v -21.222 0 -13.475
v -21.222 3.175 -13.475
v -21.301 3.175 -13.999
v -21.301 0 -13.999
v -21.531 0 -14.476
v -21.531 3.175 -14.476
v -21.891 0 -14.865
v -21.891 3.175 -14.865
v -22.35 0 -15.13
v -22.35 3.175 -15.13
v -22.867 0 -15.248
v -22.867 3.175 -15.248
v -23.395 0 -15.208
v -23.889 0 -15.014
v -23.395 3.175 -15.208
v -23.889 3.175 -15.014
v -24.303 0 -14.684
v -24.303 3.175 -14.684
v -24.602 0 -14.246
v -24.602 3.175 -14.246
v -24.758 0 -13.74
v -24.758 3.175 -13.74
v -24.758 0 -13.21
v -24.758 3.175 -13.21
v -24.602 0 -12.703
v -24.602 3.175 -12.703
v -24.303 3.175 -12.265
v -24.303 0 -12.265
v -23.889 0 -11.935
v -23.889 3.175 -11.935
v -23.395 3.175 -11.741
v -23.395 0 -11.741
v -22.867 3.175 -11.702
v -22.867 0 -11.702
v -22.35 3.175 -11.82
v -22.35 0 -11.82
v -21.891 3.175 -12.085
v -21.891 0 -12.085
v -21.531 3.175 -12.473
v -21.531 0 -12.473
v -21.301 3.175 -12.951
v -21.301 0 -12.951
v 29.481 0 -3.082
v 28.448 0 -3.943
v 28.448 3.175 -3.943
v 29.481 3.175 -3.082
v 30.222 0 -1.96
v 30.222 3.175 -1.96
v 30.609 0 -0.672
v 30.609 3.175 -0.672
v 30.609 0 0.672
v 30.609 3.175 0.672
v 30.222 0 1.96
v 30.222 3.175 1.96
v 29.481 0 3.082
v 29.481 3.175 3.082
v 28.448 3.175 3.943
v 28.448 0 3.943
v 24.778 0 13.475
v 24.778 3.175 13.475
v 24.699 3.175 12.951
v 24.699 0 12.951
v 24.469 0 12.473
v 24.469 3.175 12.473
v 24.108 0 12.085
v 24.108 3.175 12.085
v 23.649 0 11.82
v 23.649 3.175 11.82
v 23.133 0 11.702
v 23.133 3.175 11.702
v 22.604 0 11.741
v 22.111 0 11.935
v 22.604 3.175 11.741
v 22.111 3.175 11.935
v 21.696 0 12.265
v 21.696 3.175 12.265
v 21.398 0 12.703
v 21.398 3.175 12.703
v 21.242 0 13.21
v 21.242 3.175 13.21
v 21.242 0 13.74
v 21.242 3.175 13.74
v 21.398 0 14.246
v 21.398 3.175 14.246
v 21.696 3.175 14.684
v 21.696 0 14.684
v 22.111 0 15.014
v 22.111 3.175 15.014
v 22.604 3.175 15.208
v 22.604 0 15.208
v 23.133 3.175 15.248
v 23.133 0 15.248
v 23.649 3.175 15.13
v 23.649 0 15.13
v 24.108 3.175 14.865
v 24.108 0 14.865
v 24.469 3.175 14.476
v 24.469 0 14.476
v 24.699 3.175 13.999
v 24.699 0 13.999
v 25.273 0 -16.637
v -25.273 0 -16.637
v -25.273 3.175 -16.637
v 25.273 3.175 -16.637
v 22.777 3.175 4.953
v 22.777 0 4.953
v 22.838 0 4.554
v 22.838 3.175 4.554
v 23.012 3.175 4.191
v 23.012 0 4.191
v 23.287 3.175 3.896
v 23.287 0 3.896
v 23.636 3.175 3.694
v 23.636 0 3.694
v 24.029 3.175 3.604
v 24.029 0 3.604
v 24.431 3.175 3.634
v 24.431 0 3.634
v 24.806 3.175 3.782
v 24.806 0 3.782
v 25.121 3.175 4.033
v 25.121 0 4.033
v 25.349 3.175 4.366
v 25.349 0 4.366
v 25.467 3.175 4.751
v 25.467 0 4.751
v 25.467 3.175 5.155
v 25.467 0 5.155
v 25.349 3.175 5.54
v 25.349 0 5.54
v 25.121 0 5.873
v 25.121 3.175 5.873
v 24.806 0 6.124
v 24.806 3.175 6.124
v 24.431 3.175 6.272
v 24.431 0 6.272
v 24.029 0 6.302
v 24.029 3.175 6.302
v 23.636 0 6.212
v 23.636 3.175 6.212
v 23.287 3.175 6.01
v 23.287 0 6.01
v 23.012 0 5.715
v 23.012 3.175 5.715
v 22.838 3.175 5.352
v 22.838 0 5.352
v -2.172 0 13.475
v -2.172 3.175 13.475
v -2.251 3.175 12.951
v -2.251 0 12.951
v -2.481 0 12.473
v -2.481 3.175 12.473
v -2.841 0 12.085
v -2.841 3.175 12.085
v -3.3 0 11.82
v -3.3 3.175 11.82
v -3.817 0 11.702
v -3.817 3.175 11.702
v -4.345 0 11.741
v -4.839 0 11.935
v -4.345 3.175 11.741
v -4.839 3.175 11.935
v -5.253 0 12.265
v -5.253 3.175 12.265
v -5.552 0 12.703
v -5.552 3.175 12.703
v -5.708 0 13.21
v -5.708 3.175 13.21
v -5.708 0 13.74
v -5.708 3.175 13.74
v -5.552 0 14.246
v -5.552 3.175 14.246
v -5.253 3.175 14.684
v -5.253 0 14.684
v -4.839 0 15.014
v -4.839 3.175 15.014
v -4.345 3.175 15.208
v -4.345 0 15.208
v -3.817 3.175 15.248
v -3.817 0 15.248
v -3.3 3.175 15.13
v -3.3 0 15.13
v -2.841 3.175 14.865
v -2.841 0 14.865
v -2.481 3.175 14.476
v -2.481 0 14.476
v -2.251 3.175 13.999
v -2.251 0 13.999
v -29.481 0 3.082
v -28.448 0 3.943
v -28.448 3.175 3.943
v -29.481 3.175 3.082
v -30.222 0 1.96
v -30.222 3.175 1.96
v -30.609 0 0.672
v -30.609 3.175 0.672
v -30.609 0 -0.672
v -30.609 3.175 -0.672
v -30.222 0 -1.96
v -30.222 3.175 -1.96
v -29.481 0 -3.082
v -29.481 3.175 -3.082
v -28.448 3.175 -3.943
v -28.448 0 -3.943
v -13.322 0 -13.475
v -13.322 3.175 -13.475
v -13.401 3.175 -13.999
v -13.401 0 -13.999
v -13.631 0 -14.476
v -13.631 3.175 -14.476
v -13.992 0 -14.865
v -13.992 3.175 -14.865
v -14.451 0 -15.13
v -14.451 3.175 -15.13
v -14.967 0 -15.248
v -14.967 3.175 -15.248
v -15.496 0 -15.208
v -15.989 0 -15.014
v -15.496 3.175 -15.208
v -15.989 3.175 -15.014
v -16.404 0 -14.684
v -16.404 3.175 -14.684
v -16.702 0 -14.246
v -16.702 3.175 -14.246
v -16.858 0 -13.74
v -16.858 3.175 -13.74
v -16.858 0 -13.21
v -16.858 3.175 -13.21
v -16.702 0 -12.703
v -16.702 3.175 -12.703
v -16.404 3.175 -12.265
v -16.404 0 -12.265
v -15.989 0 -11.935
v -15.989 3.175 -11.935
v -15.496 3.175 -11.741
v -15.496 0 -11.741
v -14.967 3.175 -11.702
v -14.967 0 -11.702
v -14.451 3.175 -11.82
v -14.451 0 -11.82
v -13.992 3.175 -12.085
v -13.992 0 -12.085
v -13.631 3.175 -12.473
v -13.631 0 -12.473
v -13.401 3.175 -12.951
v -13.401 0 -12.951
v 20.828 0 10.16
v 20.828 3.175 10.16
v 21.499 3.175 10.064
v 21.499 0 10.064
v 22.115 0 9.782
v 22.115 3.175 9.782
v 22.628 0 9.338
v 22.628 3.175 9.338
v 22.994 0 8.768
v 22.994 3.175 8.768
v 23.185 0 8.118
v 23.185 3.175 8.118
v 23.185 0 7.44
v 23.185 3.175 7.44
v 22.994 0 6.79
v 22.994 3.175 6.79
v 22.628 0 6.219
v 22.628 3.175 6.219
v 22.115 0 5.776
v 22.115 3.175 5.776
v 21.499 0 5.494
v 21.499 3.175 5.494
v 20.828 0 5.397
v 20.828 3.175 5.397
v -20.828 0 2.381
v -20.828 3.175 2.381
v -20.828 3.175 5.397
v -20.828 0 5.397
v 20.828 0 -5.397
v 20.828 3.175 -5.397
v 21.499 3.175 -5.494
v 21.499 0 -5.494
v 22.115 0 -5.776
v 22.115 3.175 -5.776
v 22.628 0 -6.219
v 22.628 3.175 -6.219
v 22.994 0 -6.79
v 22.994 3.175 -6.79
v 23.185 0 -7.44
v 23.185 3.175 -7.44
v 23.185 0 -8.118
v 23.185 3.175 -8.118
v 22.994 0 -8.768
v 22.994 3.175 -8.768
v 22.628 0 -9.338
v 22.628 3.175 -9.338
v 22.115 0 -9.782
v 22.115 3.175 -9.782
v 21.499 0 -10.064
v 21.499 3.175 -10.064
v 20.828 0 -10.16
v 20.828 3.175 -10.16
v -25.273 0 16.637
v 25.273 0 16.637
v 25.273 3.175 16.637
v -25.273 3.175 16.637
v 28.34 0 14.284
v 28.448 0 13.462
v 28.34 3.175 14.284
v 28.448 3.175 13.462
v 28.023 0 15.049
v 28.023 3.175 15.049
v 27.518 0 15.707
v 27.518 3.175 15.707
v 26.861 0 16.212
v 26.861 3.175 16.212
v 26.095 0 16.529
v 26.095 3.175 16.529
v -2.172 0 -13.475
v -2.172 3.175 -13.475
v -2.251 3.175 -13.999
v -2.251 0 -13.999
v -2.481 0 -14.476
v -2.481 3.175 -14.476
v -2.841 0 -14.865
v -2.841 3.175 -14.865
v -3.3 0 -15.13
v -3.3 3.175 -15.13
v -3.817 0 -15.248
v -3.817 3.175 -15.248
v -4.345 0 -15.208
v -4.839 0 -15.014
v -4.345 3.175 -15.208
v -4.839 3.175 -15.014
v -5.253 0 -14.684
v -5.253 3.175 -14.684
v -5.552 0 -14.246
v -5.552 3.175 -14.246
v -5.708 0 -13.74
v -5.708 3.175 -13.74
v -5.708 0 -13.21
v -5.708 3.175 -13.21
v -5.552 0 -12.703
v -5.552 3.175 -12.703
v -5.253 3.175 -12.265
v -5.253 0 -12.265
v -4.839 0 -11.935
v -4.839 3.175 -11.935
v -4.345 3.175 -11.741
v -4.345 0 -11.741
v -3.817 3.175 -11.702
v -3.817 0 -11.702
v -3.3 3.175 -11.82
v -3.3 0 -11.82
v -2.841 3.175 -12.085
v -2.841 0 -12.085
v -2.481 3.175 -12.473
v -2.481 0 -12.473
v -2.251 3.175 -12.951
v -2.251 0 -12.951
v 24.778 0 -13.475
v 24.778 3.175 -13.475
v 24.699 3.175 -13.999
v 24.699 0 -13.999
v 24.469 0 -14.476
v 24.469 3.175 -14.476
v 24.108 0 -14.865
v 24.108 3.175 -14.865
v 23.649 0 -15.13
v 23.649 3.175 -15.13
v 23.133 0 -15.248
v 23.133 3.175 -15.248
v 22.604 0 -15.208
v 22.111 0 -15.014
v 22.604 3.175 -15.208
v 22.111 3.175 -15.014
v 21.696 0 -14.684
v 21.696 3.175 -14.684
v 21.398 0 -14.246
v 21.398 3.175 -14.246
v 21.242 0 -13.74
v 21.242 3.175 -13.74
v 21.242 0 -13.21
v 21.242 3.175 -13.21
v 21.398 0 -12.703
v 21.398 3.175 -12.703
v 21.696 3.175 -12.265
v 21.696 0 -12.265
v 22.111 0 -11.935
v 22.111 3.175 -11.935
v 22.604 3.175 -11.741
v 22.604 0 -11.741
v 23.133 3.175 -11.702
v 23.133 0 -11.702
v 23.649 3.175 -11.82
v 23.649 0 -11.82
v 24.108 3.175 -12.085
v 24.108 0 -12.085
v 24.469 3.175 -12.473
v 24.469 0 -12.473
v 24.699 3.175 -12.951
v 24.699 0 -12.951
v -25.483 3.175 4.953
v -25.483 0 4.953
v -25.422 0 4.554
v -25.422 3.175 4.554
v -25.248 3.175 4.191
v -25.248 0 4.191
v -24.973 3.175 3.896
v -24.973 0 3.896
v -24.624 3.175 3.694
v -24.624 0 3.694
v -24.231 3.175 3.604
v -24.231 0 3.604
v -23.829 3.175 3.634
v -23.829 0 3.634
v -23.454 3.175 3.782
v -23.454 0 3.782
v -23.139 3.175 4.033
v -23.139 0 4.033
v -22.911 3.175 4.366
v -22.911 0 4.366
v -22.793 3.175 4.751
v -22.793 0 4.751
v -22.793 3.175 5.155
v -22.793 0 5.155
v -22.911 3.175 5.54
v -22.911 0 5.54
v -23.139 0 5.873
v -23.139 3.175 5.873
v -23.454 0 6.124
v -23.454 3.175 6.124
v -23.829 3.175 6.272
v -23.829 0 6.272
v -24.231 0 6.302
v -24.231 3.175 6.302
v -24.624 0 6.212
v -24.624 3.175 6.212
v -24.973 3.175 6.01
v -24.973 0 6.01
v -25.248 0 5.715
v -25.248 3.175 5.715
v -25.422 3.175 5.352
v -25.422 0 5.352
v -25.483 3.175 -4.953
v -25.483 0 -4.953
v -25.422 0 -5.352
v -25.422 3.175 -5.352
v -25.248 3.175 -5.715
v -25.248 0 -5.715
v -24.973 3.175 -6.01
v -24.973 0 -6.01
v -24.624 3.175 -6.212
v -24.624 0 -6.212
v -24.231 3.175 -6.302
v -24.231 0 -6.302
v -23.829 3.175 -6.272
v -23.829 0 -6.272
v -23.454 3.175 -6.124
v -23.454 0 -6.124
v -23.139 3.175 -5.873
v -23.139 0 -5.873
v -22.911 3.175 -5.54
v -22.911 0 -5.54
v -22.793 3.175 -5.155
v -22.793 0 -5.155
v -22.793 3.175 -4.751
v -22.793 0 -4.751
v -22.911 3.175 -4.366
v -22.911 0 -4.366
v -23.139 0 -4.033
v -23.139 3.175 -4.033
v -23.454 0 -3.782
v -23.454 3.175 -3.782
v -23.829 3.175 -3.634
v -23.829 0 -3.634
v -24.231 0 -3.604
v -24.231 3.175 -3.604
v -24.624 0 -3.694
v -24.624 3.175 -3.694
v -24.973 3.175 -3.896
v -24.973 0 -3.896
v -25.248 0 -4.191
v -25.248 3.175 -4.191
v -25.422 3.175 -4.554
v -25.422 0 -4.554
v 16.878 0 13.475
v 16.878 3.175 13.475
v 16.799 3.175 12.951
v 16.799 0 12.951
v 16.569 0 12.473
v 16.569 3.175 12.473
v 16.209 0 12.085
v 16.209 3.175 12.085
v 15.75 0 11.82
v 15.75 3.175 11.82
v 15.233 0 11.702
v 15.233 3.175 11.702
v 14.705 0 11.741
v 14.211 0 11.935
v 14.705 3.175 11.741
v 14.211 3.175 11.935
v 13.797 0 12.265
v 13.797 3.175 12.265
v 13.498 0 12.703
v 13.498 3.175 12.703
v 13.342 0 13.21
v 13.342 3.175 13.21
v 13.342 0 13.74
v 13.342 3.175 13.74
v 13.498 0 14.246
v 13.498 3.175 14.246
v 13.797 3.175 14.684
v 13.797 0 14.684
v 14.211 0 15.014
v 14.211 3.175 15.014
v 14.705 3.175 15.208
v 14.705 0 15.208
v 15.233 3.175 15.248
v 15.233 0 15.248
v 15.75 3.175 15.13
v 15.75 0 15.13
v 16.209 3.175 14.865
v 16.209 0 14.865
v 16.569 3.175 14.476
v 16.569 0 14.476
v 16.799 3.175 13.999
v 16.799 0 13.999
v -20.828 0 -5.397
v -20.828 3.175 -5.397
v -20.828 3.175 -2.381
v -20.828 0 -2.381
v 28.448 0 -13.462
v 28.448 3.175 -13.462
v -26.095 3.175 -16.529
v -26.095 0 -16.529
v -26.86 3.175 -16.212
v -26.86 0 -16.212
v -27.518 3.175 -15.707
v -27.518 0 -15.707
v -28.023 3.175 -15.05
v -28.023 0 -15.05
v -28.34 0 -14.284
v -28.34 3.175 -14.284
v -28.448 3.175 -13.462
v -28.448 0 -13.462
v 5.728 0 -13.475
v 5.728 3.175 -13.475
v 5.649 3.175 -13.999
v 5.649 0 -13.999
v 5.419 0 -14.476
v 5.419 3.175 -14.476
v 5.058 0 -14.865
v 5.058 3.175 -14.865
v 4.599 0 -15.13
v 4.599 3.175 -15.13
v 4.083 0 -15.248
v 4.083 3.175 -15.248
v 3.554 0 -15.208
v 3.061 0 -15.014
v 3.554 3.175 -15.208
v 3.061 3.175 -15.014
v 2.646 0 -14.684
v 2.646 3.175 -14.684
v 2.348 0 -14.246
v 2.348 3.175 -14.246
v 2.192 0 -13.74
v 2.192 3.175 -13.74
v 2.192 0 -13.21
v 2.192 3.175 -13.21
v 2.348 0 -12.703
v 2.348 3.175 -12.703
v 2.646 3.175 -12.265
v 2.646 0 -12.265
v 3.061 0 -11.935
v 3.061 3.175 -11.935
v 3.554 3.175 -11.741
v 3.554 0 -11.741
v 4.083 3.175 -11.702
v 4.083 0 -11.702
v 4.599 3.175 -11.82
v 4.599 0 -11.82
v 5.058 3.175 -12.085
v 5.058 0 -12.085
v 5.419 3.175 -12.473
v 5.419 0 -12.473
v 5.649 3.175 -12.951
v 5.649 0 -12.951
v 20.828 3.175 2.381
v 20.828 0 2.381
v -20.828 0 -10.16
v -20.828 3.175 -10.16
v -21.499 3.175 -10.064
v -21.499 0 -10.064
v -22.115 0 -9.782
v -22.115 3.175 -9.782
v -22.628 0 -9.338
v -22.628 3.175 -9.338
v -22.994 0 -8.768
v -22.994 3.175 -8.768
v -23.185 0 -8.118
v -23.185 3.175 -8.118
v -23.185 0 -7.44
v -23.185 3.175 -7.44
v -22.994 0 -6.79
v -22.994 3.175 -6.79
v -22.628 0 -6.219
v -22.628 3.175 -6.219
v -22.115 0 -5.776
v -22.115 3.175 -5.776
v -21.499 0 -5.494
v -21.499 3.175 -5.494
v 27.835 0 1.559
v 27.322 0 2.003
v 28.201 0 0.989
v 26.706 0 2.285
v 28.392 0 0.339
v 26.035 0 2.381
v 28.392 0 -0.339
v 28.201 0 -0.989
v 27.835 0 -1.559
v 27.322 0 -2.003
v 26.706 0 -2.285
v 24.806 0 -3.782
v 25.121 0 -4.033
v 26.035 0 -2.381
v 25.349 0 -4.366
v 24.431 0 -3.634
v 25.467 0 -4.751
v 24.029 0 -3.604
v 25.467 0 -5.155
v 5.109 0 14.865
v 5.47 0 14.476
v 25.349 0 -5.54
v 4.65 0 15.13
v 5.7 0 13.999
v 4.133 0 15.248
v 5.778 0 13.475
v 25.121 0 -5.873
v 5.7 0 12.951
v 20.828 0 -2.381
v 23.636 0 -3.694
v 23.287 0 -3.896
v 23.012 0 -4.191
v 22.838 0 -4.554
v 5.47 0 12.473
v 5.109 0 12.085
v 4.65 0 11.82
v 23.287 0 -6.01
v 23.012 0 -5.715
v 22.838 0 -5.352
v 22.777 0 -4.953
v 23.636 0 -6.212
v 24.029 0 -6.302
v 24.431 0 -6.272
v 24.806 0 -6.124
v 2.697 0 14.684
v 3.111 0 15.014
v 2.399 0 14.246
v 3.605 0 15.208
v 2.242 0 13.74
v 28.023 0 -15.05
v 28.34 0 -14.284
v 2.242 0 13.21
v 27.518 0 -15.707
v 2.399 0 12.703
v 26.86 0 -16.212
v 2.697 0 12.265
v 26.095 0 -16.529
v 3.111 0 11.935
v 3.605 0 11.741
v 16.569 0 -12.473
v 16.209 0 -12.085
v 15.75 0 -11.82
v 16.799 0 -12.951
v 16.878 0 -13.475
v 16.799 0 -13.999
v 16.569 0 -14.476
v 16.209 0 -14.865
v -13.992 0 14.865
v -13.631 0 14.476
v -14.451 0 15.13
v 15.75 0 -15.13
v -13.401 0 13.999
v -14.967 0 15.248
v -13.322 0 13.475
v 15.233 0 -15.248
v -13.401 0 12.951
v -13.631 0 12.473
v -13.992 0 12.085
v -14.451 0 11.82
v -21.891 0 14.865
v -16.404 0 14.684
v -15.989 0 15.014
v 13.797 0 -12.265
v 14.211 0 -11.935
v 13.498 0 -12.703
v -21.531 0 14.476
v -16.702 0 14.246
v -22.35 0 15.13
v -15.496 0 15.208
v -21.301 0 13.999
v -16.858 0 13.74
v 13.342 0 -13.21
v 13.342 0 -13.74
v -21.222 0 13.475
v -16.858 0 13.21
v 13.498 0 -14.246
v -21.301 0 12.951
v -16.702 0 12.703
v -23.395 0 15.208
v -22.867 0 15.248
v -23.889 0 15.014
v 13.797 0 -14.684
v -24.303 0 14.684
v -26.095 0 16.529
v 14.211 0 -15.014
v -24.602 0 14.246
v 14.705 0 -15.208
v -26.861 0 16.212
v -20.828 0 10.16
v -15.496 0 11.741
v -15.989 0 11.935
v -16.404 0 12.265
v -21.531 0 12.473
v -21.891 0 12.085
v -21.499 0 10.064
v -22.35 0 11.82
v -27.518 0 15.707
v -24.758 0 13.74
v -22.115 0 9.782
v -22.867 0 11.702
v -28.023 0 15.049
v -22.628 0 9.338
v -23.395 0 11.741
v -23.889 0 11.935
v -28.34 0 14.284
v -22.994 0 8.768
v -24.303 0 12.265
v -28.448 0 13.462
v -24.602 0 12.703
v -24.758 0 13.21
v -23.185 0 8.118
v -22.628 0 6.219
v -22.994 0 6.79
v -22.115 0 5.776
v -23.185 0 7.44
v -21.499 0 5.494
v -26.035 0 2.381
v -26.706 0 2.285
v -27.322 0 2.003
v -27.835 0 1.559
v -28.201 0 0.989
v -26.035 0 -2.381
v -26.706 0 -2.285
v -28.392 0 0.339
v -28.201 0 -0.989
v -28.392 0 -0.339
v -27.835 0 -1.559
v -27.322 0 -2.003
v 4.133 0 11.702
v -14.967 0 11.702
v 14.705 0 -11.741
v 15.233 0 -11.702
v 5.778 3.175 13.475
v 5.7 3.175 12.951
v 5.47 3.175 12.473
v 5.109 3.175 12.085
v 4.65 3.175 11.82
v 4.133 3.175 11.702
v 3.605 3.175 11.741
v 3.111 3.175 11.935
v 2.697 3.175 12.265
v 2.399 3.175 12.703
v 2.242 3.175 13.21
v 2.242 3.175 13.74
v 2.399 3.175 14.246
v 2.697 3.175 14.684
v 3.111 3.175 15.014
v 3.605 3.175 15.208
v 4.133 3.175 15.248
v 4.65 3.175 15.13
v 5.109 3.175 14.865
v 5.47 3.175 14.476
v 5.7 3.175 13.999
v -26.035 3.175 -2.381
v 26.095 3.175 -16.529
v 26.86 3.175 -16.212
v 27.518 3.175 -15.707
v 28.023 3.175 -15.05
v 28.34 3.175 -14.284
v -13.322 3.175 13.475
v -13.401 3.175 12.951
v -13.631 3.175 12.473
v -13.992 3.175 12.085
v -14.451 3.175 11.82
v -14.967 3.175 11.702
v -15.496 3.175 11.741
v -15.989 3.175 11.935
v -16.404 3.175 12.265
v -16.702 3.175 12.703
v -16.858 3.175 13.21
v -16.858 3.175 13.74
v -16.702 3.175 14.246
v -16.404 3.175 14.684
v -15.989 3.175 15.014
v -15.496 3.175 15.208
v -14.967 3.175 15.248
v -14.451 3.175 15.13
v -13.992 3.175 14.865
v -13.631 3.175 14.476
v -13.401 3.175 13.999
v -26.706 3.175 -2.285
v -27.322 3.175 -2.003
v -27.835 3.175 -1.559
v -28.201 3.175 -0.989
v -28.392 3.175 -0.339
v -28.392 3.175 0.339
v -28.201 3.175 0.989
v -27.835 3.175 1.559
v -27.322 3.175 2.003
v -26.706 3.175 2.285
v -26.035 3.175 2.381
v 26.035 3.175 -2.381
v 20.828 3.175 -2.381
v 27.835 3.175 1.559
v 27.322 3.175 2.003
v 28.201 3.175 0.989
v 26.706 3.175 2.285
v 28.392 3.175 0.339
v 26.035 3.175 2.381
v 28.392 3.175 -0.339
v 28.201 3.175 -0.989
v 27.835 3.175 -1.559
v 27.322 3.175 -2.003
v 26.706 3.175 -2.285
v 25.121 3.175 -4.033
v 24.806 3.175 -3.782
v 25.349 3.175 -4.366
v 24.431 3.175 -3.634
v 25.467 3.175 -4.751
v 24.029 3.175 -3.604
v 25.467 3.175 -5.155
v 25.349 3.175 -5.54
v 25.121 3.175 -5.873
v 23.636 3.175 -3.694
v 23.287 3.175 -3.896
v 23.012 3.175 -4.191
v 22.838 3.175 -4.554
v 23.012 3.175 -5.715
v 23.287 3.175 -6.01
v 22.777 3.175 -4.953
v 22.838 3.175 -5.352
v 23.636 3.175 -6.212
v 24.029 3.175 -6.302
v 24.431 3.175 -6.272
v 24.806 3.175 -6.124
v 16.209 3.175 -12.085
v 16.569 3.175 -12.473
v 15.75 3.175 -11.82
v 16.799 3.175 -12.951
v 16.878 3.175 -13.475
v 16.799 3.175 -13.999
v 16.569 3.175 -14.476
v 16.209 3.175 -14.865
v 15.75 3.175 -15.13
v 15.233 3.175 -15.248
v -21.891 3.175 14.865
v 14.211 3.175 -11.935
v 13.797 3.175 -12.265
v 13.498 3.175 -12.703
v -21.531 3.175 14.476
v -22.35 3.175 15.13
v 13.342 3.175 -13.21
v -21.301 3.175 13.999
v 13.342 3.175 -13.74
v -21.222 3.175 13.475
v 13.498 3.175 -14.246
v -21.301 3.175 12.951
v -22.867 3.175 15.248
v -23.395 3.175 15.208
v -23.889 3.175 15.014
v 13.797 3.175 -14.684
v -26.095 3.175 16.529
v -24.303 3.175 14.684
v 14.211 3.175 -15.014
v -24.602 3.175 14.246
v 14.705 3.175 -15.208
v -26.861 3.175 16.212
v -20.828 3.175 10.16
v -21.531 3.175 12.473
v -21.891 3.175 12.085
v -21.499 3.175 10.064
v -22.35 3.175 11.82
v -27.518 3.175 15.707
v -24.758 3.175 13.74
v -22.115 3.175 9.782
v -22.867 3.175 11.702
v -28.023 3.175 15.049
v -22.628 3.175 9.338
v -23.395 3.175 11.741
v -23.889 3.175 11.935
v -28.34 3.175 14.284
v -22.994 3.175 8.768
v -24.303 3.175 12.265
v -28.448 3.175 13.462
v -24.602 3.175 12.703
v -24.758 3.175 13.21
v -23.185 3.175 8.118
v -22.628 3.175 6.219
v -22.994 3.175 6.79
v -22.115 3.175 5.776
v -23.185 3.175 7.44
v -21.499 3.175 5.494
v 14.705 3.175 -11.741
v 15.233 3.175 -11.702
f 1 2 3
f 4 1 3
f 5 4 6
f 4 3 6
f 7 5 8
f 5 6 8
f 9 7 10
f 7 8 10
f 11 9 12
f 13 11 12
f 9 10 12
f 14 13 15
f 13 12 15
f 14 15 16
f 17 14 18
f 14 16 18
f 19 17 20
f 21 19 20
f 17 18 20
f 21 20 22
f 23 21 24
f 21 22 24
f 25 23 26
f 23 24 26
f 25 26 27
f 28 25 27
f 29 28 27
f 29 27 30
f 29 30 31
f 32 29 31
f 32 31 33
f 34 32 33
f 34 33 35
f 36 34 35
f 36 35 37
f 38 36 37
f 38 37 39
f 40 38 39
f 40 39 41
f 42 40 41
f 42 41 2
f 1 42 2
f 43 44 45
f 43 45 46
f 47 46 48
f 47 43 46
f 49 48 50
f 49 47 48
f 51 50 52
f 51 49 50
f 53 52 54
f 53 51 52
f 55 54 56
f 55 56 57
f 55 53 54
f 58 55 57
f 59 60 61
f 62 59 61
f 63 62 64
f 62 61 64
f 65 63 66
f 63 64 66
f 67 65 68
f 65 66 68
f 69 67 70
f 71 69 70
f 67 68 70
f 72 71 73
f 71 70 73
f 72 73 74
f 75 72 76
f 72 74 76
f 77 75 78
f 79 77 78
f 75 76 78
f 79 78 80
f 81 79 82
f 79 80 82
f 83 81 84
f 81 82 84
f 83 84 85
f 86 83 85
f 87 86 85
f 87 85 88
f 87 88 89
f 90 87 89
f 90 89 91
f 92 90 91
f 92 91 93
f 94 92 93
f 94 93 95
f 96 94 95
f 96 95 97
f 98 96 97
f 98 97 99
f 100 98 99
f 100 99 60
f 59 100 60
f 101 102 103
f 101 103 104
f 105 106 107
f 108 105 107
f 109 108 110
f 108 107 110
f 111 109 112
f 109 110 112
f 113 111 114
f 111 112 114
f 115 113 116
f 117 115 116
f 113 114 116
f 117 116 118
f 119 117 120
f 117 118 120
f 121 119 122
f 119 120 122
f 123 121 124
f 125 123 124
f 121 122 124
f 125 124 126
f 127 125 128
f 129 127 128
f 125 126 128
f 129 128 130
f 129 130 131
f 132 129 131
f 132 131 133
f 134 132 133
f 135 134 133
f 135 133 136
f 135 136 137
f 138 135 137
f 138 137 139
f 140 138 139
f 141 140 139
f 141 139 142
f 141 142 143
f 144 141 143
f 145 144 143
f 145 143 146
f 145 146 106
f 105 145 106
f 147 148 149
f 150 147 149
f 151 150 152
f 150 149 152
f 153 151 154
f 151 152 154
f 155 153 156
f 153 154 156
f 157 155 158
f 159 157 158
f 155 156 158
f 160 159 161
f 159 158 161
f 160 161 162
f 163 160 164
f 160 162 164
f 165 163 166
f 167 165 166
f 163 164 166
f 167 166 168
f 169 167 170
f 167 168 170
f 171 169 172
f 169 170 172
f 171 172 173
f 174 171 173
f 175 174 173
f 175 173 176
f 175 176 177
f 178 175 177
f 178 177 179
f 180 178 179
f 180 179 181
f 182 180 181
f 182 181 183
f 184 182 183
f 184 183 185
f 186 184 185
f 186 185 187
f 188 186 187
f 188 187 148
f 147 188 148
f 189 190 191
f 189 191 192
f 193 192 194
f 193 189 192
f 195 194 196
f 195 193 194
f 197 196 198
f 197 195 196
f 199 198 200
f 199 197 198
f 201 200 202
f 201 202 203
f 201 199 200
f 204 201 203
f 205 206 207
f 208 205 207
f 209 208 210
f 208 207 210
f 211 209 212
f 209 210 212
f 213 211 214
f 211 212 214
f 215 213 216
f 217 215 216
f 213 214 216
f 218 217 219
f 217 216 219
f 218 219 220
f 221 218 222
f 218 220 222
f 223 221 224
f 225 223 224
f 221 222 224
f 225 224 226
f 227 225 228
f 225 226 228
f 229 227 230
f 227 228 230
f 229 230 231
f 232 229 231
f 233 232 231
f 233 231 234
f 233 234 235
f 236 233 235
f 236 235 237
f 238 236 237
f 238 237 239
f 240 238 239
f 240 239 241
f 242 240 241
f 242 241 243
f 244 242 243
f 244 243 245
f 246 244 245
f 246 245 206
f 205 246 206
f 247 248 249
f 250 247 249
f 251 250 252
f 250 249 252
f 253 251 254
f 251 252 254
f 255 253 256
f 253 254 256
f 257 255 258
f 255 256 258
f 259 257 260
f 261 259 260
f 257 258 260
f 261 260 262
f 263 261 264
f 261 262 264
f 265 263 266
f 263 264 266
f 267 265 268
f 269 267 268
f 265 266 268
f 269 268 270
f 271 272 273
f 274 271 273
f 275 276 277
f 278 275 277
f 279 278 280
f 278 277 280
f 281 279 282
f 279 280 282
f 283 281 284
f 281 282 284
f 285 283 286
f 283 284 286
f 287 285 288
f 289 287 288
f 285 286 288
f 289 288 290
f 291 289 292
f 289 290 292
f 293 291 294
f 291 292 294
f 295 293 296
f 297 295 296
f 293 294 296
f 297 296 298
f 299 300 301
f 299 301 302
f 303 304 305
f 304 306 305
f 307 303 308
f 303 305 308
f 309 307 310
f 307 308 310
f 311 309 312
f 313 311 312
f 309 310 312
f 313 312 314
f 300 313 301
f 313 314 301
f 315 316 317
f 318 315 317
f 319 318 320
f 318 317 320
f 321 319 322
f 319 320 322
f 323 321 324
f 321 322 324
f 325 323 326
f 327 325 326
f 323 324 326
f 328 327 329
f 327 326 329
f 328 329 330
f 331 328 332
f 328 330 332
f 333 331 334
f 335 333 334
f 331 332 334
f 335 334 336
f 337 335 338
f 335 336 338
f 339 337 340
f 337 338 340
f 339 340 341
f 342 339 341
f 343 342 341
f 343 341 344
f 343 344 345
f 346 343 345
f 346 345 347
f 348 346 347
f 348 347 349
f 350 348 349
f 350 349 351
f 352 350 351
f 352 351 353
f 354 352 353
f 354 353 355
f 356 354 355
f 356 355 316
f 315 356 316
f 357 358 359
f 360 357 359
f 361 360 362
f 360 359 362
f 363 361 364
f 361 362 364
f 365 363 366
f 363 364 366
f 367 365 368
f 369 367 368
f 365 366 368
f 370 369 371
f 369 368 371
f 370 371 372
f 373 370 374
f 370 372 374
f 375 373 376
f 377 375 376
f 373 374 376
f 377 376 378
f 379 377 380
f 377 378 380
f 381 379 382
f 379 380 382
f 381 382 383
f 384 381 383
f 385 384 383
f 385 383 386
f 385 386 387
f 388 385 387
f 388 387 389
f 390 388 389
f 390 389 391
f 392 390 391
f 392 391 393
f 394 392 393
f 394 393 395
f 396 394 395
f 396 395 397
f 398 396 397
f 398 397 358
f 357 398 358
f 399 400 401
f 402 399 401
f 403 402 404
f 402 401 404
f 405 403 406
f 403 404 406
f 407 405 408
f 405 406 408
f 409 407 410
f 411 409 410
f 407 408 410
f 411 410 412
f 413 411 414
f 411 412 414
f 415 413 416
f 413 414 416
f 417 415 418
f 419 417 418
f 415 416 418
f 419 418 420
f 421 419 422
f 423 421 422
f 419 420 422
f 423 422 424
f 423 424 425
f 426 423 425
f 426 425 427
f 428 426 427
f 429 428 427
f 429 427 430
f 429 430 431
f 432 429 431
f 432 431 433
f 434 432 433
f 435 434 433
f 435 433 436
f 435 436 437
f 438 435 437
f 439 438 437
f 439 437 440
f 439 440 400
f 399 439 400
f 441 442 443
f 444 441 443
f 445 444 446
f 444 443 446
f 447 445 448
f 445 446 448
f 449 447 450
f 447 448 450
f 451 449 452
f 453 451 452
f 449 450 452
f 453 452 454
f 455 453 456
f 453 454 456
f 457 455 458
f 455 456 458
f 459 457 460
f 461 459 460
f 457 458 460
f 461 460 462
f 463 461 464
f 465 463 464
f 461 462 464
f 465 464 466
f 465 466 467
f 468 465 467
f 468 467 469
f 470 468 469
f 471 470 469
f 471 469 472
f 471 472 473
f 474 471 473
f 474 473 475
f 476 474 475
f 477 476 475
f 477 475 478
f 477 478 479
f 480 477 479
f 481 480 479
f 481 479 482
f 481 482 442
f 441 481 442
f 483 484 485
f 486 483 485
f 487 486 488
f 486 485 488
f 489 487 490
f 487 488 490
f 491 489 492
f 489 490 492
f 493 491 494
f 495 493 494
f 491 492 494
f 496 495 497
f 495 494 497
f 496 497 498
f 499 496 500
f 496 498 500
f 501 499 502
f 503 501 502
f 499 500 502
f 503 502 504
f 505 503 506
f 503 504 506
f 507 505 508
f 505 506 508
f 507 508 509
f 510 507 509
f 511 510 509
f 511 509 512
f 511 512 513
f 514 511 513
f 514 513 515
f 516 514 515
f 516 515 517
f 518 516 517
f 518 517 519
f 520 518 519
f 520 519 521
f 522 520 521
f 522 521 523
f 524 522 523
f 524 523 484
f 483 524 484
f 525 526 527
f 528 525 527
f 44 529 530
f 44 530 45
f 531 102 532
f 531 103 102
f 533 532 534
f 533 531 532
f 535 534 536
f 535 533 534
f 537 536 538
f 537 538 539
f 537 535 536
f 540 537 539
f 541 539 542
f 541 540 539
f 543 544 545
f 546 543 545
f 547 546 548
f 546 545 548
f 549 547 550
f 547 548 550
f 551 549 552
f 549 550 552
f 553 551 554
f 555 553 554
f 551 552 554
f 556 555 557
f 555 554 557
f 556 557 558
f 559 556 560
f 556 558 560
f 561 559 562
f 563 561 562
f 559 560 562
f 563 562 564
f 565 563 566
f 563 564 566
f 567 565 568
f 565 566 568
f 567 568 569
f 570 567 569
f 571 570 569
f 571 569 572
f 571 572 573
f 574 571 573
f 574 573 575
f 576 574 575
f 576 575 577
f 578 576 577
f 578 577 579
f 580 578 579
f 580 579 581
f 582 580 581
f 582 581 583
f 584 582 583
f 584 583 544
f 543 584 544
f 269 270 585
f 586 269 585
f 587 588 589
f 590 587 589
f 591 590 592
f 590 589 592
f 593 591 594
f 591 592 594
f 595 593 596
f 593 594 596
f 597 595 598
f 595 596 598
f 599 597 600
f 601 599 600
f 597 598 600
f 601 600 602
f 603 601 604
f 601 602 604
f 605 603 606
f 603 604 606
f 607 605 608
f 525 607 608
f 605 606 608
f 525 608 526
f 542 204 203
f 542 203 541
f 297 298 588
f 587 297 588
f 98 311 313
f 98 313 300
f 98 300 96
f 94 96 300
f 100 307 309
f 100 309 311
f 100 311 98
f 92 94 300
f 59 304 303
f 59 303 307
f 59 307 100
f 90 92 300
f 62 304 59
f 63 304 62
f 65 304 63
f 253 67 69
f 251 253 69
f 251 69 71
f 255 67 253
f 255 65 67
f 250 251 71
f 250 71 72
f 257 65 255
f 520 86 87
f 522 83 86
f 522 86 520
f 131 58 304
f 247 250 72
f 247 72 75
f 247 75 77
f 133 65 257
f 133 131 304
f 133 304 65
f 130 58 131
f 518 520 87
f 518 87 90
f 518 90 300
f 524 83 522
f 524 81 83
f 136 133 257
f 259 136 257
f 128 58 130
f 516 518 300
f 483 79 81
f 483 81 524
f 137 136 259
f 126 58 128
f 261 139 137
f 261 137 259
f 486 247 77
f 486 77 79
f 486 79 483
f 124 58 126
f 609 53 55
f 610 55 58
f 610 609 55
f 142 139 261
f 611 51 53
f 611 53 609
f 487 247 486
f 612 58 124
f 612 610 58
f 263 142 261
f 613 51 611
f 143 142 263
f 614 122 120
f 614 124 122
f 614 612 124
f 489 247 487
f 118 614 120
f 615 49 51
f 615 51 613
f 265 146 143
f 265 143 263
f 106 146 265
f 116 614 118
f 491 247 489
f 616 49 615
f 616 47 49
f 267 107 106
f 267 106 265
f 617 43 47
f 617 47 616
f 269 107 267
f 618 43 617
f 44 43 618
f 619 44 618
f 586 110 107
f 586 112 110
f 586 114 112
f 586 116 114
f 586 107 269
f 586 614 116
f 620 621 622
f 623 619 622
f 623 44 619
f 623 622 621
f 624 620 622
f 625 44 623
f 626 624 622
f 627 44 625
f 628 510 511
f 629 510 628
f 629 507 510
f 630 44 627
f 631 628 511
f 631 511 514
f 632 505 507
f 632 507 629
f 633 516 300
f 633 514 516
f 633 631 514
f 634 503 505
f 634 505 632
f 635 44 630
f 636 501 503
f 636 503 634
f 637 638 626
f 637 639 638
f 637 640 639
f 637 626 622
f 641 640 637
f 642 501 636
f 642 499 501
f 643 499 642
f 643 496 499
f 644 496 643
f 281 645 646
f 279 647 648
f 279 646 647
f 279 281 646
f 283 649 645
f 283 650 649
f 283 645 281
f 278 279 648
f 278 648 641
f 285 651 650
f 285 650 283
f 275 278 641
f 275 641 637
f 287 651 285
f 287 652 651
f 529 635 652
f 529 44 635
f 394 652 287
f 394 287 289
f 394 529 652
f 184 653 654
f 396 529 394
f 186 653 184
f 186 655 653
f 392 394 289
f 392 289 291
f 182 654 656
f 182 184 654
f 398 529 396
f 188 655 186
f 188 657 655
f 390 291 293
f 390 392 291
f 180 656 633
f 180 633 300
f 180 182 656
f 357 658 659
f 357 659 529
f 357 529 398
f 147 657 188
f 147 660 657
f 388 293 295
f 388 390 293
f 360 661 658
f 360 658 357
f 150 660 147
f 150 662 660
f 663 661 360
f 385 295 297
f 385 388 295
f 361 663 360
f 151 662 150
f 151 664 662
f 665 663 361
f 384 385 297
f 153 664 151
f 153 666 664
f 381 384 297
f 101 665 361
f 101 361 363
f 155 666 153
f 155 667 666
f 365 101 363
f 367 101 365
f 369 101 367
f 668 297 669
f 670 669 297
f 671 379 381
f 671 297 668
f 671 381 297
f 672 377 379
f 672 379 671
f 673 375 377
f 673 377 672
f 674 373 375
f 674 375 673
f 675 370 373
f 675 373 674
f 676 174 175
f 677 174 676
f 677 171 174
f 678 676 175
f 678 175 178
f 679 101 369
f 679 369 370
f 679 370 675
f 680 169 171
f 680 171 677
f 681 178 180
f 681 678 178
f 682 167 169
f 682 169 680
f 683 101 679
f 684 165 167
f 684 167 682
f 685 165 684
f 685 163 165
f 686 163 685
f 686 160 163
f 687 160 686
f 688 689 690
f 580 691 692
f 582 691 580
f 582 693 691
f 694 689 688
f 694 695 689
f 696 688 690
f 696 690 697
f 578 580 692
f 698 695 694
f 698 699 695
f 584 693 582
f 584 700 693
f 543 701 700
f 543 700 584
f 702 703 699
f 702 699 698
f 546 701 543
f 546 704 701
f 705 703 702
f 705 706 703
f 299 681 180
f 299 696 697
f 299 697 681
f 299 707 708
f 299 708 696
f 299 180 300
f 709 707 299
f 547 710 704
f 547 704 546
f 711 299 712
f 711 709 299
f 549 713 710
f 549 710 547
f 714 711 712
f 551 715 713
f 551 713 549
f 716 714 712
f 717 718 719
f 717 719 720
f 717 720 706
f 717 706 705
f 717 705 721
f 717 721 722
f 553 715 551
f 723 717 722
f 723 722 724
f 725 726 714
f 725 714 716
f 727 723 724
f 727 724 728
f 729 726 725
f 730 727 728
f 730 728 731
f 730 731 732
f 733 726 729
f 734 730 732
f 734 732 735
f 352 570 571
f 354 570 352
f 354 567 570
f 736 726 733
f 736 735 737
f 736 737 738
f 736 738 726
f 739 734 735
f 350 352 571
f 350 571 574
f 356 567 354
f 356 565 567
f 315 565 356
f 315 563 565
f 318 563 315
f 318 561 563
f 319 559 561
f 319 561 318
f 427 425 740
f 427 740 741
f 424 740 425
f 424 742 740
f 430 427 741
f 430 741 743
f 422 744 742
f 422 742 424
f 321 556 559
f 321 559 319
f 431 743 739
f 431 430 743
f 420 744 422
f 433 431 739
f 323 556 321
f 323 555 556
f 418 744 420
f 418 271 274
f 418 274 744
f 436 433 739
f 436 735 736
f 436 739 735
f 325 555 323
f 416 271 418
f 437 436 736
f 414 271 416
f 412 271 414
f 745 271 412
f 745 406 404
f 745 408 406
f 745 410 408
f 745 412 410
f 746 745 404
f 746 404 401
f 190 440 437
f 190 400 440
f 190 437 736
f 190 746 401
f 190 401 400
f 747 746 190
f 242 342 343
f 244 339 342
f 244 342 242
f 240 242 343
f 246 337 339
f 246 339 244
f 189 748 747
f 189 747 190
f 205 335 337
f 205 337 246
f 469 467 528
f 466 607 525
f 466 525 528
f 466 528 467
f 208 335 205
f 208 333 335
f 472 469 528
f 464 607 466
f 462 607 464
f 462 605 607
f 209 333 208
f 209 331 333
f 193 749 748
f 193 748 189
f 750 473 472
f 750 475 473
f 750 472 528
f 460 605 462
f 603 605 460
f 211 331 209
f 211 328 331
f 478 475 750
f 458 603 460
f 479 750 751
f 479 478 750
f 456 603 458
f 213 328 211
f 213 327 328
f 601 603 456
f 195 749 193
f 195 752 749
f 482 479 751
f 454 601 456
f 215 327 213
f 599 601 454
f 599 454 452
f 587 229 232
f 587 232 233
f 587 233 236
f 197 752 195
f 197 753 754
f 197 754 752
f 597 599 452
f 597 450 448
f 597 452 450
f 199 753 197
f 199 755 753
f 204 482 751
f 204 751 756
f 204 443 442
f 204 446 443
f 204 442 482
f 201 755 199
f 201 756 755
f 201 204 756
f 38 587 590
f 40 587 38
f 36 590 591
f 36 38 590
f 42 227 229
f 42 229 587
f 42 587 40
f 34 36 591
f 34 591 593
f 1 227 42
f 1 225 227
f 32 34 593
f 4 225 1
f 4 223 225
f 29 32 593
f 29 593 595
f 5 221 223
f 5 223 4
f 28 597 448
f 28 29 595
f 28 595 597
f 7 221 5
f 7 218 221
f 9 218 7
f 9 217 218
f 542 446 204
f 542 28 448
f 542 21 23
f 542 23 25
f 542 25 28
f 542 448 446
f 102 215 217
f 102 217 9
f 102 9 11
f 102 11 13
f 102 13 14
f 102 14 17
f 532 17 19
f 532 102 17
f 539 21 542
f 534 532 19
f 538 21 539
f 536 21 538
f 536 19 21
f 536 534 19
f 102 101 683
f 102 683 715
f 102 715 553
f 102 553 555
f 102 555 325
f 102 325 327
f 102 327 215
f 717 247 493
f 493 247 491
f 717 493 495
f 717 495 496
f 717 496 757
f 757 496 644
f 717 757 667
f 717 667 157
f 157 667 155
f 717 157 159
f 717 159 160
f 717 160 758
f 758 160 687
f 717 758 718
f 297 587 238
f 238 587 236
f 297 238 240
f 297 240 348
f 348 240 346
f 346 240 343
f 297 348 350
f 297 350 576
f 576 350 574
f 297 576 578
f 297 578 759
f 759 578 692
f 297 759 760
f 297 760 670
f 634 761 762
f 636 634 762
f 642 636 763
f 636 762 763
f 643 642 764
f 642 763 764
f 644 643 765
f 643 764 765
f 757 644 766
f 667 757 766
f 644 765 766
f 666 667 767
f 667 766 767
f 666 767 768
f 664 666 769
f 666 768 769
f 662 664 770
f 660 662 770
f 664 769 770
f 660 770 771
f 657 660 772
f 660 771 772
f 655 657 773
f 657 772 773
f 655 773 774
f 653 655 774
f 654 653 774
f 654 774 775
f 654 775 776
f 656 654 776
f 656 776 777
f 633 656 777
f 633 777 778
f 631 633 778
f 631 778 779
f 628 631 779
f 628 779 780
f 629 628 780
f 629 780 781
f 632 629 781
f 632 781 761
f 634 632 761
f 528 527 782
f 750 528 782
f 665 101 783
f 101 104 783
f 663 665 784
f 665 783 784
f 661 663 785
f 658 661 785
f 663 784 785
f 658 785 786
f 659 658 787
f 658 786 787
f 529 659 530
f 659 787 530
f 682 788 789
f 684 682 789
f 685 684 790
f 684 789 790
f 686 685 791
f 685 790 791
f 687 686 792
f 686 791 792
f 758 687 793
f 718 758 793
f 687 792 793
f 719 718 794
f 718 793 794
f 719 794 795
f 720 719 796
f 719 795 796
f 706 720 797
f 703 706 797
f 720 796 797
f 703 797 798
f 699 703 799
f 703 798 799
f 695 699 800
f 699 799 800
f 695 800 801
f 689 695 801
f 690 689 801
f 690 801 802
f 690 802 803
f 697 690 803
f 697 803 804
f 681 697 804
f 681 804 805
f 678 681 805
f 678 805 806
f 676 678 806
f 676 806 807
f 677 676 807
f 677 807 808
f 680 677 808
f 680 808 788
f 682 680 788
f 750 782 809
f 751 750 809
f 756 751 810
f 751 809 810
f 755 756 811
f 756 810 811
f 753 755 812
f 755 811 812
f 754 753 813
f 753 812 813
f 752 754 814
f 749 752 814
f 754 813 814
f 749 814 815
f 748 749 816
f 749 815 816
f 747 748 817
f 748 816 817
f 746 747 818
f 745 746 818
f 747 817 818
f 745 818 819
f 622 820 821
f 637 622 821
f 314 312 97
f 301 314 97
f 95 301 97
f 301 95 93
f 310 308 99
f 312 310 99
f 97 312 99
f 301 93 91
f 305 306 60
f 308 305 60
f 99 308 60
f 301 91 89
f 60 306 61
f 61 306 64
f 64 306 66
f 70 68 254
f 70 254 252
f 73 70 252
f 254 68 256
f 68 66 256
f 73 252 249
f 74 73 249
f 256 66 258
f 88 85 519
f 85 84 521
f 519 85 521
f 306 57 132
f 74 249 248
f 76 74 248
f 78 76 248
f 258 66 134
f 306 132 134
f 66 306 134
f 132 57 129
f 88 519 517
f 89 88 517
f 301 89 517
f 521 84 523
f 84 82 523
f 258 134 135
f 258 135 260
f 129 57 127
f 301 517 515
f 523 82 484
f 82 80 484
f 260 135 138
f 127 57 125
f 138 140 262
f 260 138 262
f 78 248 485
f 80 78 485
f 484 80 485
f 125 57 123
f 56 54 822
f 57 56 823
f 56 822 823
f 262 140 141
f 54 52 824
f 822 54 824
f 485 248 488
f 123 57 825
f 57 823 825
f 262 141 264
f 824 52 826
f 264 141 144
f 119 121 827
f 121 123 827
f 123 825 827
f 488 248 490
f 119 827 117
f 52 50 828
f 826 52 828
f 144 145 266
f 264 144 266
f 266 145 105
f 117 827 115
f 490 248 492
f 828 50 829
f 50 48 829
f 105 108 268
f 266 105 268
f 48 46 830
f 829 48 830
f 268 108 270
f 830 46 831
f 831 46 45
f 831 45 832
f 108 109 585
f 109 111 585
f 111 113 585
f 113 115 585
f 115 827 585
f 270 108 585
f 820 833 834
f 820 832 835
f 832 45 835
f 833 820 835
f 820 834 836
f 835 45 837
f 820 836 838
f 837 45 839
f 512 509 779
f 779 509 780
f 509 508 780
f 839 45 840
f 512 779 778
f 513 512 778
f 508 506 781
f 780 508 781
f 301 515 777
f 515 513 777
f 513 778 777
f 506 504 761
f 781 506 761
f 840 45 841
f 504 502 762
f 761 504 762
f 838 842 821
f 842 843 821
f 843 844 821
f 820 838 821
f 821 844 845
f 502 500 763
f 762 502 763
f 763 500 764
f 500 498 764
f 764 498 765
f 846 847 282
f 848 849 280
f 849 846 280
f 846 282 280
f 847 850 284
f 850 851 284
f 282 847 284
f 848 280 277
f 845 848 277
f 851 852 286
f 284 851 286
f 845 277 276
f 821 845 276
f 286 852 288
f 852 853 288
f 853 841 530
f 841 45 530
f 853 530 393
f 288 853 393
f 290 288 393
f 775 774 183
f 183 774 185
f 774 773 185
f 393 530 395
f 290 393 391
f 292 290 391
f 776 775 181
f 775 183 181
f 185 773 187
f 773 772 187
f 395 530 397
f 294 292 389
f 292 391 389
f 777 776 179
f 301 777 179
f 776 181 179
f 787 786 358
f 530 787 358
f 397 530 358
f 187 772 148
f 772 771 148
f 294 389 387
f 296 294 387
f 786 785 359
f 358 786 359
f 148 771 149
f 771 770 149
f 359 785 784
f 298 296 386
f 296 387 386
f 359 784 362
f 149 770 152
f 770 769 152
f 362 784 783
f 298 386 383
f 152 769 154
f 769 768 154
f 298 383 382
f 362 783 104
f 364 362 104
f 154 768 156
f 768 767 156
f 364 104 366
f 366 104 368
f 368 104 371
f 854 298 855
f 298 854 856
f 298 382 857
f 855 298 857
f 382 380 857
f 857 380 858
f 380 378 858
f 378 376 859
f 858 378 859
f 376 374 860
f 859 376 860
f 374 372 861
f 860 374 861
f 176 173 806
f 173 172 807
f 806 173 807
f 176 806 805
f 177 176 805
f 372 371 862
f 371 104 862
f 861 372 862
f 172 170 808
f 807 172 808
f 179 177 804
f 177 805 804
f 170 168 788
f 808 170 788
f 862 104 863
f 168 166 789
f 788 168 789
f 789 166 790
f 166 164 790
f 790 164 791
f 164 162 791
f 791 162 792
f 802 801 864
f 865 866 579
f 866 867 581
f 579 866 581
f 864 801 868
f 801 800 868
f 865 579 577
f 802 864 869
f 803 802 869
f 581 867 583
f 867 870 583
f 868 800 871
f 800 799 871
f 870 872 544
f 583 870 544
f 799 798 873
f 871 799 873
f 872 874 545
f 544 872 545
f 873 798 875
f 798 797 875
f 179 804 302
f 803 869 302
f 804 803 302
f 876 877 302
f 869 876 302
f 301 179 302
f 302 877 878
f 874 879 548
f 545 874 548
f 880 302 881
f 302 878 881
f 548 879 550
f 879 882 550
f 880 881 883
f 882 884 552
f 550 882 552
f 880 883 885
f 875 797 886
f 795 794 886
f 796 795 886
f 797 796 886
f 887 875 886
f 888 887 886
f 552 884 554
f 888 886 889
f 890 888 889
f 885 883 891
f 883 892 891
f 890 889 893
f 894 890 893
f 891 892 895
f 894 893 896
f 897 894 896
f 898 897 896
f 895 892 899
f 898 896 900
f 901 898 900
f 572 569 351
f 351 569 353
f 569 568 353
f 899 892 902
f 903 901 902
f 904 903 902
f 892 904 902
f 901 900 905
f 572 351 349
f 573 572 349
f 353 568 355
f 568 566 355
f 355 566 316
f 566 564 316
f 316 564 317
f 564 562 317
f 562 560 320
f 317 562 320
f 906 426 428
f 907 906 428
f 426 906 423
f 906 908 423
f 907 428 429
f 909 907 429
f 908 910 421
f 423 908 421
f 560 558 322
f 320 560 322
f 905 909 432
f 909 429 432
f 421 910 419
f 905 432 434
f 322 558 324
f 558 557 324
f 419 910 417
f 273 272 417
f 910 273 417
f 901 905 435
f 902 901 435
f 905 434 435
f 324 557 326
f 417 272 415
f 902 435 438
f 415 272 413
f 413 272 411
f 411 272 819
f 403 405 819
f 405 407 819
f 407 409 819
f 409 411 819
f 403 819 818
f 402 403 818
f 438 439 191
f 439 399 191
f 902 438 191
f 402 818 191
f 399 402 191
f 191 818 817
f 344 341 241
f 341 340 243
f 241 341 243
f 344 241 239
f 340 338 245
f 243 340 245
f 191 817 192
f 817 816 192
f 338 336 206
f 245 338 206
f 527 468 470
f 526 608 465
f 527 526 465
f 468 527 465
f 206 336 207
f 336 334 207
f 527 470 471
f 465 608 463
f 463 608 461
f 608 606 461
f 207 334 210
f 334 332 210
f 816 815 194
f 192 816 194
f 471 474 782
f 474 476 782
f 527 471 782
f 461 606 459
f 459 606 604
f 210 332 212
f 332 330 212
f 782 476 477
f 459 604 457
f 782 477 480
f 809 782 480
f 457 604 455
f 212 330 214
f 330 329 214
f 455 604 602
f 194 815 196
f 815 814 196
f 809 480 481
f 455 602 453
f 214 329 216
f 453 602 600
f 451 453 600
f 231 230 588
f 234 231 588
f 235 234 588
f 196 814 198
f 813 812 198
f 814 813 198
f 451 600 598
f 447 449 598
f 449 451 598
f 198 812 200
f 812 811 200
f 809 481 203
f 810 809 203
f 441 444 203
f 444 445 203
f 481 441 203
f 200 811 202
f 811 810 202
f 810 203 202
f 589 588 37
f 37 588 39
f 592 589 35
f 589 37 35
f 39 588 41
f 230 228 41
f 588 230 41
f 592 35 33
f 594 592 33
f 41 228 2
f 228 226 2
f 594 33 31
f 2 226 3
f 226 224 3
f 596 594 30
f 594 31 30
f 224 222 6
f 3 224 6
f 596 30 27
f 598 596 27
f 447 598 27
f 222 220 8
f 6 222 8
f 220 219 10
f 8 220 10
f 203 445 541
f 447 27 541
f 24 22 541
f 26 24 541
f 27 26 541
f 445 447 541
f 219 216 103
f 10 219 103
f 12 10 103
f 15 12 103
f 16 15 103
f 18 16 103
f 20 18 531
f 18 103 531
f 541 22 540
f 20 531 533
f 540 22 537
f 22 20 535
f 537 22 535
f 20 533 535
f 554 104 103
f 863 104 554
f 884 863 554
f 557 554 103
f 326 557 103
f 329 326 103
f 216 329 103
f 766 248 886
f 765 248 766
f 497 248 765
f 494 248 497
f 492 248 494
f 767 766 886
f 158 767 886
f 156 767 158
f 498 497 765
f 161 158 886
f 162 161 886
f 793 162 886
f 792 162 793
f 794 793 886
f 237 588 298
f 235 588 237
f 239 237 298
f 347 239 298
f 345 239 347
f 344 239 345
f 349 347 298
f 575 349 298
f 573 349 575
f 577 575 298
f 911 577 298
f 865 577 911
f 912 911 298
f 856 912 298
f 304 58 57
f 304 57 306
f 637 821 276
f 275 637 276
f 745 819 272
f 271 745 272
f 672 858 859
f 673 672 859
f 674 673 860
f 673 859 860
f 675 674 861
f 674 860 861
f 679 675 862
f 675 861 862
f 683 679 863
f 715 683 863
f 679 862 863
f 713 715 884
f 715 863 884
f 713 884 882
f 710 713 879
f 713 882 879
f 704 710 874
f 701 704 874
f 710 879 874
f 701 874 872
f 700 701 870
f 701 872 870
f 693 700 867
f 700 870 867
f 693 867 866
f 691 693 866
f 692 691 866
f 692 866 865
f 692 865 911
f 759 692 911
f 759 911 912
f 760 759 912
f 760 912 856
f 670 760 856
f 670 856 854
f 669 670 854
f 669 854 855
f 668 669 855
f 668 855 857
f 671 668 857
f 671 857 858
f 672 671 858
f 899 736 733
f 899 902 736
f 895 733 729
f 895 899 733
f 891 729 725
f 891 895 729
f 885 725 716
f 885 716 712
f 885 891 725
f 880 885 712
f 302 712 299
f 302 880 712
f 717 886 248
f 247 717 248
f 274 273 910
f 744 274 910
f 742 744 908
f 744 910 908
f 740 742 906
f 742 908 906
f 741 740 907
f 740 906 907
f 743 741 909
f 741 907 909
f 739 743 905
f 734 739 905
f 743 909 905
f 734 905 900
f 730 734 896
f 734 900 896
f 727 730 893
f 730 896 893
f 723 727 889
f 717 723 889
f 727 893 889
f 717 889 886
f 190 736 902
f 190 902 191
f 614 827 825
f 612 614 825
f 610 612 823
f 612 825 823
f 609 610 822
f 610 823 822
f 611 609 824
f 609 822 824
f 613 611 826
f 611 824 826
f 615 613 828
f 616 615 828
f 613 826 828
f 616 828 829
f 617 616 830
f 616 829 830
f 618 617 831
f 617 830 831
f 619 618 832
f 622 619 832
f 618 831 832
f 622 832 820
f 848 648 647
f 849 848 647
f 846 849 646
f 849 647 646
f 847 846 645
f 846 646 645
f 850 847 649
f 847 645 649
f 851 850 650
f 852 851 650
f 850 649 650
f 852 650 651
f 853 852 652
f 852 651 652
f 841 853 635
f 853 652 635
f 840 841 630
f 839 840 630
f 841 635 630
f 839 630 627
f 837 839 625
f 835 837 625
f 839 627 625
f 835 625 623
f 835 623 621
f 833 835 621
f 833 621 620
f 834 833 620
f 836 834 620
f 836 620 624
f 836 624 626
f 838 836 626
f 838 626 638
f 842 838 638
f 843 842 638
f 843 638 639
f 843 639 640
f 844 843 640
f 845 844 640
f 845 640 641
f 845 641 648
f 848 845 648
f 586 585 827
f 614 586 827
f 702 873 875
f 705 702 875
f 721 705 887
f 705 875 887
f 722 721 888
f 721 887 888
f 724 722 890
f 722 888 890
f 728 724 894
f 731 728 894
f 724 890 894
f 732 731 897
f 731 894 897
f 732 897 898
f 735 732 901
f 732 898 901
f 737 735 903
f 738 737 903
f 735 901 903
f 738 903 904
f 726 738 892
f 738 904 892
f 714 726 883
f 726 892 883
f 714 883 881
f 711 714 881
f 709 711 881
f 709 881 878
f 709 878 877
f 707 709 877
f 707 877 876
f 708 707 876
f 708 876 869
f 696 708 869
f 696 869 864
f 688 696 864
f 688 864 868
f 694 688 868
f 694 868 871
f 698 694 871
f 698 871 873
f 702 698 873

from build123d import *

# Parameters (mm, degrees)
MASS_DEPTH               = 3.175
SKETCH2_W                = 41.656
SKETCH2_H                = 4.7625
SERVO_HOLE_DEPTH         = 4.175
F_6_32_SERVO_MOUNT_D     = 2.7051
F_6_32_SERVO_MOUNT_DEPTH = 152.4
F_6_32_SERVO_MOUNT_TIP   = 0.81269403
CORNERS_R                = 3.175
SKETCH5_R                = 1.778
MOUNTING_HOLES_DEPTH     = 4.175


with BuildPart() as part:
    # Sketch1 → Mass (new body)
    with BuildSketch(Plane(origin=(0, 0, 0), x_dir=(1, 0, 0), z_dir=(0, 1, 0))):
        with BuildLine():
            Line((-28.448, 16.637), (28.448, 16.637))
            Line((28.448, 16.637), (28.448, 3.943058564))
            ThreePointArc((28.448, 3.943058564), (30.6578, 0), (28.448, -3.943058564))
            Line((28.448, -3.943058564), (28.448, -16.637))
            Line((28.448, -16.637), (-28.448, -16.637))
            Line((-28.448, -16.637), (-28.448, -3.943058564))
            ThreePointArc((-28.448, -3.943058564), (-30.6578, 0), (-28.448, 3.943058564))
            Line((-28.448, 3.943058564), (-28.448, 16.637))
        make_face()
    extrude(amount=MASS_DEPTH)

    # Sketch2 → Servo Hole (cut, through all)
    with BuildSketch(Plane(origin=(0, 3.175, 0), x_dir=(1, 0, 0), z_dir=(0, 1, 0))):
        with BuildLine():
            ThreePointArc((-20.828, -5.3975), (-23.20925, -7.77875), (-20.828, -10.16))
            Line((-20.828, -10.16), (20.828, -10.16))
            ThreePointArc((20.828, -10.16), (23.20925, -7.77875), (20.828, -5.3975))
            Line((20.828, -5.3975), (20.828, -2.38125))
            Line((20.828, -2.38125), (-20.828, -2.38125))
            Line((-20.828, -2.38125), (-20.828, -5.3975))
        make_face()
        Rectangle(SKETCH2_W, SKETCH2_H)
        with BuildLine():
            Line((-20.828, 5.3975), (-20.828, 2.38125))
            Line((-20.828, 2.38125), (20.828, 2.38125))
            Line((20.828, 2.38125), (20.828, 5.3975))
            ThreePointArc((20.828, 5.3975), (23.20925, 7.77875), (20.828, 10.16))
            Line((20.828, 10.16), (-20.828, 10.16))
            ThreePointArc((-20.828, 10.16), (-23.20925, 7.77875), (-20.828, 5.3975))
        make_face()
        with BuildLine():
            Line((20.828, 2.38125), (20.828, -2.38125))
            Line((20.828, -2.38125), (26.035, -2.38125))
            ThreePointArc((26.035, -2.38125), (28.41625, 0), (26.035, 2.38125))
            Line((26.035, 2.38125), (20.828, 2.38125))
        make_face()
        with BuildLine():
            Line((-26.035, -2.38125), (-20.828, -2.38125))
            Line((-20.828, -2.38125), (-20.828, 2.38125))
            Line((-20.828, 2.38125), (-26.035, 2.38125))
            ThreePointArc((-26.035, 2.38125), (-28.41625, 0), (-26.035, -2.38125))
        make_face()
    extrude(amount=-SERVO_HOLE_DEPTH, mode=Mode.SUBTRACT)

    # #6-32 Servo Mount
    with Locations(Plane(origin=(0, 3.175, 0), x_dir=(1, 0, 0), z_dir=(0, 1, 0))):
        with Locations((24.13, 4.953), (24.13, -4.953), (-24.13, -4.953), (-24.13, 4.953)):
            Hole(F_6_32_SERVO_MOUNT_D / 2, depth=F_6_32_SERVO_MOUNT_DEPTH)
            with Locations((0, 0, -(F_6_32_SERVO_MOUNT_DEPTH + F_6_32_SERVO_MOUNT_TIP / 2))):  # 118° drill point
                Cone(0, F_6_32_SERVO_MOUNT_D / 2, F_6_32_SERVO_MOUNT_TIP, mode=Mode.SUBTRACT)

    # Corners
    corners_edges = [part.edges().sort_by_distance(p)[0] for p in [
        (-28.448, 1.5875, -16.637),
        (28.448, 1.5875, -16.637),
        (28.448, 1.5875, 16.637),
        (-28.448, 1.5875, 16.637),
    ]]
    fillet(corners_edges, radius=CORNERS_R)

    # Sketch5 → Mounting Holes (cut, through all)
    with BuildSketch(Plane(origin=(0, 3.175, 0), x_dir=(1, 0, 0), z_dir=(0, 1, 0))):
        with Locations((-22.9997, 13.4747)):
            Circle(SKETCH5_R)
        with Locations((22.9997, 13.4747)):
            Circle(SKETCH5_R)
        with Locations((22.9997, -13.4747)):
            Circle(SKETCH5_R)
        with Locations((-22.9997, -13.4747)):
            Circle(SKETCH5_R)
        with Locations((-15.1003, 13.4747)):
            Circle(SKETCH5_R)
        with Locations((-3.9497, 13.4747)):
            Circle(SKETCH5_R)
        with Locations((3.9497, 13.4747)):
            Circle(SKETCH5_R)
        with Locations((15.1003, 13.4747)):
            Circle(SKETCH5_R)
        with Locations((15.1003, -13.4747)):
            Circle(SKETCH5_R)
        with Locations((4.0005, -13.4747)):
            Circle(SKETCH5_R)
        with Locations((-3.9497, -13.4747)):
            Circle(SKETCH5_R)
        with Locations((-15.1003, -13.4747)):
            Circle(SKETCH5_R)
    extrude(amount=-MOUNTING_HOLES_DEPTH, mode=Mode.SUBTRACT)


solid = part.part
